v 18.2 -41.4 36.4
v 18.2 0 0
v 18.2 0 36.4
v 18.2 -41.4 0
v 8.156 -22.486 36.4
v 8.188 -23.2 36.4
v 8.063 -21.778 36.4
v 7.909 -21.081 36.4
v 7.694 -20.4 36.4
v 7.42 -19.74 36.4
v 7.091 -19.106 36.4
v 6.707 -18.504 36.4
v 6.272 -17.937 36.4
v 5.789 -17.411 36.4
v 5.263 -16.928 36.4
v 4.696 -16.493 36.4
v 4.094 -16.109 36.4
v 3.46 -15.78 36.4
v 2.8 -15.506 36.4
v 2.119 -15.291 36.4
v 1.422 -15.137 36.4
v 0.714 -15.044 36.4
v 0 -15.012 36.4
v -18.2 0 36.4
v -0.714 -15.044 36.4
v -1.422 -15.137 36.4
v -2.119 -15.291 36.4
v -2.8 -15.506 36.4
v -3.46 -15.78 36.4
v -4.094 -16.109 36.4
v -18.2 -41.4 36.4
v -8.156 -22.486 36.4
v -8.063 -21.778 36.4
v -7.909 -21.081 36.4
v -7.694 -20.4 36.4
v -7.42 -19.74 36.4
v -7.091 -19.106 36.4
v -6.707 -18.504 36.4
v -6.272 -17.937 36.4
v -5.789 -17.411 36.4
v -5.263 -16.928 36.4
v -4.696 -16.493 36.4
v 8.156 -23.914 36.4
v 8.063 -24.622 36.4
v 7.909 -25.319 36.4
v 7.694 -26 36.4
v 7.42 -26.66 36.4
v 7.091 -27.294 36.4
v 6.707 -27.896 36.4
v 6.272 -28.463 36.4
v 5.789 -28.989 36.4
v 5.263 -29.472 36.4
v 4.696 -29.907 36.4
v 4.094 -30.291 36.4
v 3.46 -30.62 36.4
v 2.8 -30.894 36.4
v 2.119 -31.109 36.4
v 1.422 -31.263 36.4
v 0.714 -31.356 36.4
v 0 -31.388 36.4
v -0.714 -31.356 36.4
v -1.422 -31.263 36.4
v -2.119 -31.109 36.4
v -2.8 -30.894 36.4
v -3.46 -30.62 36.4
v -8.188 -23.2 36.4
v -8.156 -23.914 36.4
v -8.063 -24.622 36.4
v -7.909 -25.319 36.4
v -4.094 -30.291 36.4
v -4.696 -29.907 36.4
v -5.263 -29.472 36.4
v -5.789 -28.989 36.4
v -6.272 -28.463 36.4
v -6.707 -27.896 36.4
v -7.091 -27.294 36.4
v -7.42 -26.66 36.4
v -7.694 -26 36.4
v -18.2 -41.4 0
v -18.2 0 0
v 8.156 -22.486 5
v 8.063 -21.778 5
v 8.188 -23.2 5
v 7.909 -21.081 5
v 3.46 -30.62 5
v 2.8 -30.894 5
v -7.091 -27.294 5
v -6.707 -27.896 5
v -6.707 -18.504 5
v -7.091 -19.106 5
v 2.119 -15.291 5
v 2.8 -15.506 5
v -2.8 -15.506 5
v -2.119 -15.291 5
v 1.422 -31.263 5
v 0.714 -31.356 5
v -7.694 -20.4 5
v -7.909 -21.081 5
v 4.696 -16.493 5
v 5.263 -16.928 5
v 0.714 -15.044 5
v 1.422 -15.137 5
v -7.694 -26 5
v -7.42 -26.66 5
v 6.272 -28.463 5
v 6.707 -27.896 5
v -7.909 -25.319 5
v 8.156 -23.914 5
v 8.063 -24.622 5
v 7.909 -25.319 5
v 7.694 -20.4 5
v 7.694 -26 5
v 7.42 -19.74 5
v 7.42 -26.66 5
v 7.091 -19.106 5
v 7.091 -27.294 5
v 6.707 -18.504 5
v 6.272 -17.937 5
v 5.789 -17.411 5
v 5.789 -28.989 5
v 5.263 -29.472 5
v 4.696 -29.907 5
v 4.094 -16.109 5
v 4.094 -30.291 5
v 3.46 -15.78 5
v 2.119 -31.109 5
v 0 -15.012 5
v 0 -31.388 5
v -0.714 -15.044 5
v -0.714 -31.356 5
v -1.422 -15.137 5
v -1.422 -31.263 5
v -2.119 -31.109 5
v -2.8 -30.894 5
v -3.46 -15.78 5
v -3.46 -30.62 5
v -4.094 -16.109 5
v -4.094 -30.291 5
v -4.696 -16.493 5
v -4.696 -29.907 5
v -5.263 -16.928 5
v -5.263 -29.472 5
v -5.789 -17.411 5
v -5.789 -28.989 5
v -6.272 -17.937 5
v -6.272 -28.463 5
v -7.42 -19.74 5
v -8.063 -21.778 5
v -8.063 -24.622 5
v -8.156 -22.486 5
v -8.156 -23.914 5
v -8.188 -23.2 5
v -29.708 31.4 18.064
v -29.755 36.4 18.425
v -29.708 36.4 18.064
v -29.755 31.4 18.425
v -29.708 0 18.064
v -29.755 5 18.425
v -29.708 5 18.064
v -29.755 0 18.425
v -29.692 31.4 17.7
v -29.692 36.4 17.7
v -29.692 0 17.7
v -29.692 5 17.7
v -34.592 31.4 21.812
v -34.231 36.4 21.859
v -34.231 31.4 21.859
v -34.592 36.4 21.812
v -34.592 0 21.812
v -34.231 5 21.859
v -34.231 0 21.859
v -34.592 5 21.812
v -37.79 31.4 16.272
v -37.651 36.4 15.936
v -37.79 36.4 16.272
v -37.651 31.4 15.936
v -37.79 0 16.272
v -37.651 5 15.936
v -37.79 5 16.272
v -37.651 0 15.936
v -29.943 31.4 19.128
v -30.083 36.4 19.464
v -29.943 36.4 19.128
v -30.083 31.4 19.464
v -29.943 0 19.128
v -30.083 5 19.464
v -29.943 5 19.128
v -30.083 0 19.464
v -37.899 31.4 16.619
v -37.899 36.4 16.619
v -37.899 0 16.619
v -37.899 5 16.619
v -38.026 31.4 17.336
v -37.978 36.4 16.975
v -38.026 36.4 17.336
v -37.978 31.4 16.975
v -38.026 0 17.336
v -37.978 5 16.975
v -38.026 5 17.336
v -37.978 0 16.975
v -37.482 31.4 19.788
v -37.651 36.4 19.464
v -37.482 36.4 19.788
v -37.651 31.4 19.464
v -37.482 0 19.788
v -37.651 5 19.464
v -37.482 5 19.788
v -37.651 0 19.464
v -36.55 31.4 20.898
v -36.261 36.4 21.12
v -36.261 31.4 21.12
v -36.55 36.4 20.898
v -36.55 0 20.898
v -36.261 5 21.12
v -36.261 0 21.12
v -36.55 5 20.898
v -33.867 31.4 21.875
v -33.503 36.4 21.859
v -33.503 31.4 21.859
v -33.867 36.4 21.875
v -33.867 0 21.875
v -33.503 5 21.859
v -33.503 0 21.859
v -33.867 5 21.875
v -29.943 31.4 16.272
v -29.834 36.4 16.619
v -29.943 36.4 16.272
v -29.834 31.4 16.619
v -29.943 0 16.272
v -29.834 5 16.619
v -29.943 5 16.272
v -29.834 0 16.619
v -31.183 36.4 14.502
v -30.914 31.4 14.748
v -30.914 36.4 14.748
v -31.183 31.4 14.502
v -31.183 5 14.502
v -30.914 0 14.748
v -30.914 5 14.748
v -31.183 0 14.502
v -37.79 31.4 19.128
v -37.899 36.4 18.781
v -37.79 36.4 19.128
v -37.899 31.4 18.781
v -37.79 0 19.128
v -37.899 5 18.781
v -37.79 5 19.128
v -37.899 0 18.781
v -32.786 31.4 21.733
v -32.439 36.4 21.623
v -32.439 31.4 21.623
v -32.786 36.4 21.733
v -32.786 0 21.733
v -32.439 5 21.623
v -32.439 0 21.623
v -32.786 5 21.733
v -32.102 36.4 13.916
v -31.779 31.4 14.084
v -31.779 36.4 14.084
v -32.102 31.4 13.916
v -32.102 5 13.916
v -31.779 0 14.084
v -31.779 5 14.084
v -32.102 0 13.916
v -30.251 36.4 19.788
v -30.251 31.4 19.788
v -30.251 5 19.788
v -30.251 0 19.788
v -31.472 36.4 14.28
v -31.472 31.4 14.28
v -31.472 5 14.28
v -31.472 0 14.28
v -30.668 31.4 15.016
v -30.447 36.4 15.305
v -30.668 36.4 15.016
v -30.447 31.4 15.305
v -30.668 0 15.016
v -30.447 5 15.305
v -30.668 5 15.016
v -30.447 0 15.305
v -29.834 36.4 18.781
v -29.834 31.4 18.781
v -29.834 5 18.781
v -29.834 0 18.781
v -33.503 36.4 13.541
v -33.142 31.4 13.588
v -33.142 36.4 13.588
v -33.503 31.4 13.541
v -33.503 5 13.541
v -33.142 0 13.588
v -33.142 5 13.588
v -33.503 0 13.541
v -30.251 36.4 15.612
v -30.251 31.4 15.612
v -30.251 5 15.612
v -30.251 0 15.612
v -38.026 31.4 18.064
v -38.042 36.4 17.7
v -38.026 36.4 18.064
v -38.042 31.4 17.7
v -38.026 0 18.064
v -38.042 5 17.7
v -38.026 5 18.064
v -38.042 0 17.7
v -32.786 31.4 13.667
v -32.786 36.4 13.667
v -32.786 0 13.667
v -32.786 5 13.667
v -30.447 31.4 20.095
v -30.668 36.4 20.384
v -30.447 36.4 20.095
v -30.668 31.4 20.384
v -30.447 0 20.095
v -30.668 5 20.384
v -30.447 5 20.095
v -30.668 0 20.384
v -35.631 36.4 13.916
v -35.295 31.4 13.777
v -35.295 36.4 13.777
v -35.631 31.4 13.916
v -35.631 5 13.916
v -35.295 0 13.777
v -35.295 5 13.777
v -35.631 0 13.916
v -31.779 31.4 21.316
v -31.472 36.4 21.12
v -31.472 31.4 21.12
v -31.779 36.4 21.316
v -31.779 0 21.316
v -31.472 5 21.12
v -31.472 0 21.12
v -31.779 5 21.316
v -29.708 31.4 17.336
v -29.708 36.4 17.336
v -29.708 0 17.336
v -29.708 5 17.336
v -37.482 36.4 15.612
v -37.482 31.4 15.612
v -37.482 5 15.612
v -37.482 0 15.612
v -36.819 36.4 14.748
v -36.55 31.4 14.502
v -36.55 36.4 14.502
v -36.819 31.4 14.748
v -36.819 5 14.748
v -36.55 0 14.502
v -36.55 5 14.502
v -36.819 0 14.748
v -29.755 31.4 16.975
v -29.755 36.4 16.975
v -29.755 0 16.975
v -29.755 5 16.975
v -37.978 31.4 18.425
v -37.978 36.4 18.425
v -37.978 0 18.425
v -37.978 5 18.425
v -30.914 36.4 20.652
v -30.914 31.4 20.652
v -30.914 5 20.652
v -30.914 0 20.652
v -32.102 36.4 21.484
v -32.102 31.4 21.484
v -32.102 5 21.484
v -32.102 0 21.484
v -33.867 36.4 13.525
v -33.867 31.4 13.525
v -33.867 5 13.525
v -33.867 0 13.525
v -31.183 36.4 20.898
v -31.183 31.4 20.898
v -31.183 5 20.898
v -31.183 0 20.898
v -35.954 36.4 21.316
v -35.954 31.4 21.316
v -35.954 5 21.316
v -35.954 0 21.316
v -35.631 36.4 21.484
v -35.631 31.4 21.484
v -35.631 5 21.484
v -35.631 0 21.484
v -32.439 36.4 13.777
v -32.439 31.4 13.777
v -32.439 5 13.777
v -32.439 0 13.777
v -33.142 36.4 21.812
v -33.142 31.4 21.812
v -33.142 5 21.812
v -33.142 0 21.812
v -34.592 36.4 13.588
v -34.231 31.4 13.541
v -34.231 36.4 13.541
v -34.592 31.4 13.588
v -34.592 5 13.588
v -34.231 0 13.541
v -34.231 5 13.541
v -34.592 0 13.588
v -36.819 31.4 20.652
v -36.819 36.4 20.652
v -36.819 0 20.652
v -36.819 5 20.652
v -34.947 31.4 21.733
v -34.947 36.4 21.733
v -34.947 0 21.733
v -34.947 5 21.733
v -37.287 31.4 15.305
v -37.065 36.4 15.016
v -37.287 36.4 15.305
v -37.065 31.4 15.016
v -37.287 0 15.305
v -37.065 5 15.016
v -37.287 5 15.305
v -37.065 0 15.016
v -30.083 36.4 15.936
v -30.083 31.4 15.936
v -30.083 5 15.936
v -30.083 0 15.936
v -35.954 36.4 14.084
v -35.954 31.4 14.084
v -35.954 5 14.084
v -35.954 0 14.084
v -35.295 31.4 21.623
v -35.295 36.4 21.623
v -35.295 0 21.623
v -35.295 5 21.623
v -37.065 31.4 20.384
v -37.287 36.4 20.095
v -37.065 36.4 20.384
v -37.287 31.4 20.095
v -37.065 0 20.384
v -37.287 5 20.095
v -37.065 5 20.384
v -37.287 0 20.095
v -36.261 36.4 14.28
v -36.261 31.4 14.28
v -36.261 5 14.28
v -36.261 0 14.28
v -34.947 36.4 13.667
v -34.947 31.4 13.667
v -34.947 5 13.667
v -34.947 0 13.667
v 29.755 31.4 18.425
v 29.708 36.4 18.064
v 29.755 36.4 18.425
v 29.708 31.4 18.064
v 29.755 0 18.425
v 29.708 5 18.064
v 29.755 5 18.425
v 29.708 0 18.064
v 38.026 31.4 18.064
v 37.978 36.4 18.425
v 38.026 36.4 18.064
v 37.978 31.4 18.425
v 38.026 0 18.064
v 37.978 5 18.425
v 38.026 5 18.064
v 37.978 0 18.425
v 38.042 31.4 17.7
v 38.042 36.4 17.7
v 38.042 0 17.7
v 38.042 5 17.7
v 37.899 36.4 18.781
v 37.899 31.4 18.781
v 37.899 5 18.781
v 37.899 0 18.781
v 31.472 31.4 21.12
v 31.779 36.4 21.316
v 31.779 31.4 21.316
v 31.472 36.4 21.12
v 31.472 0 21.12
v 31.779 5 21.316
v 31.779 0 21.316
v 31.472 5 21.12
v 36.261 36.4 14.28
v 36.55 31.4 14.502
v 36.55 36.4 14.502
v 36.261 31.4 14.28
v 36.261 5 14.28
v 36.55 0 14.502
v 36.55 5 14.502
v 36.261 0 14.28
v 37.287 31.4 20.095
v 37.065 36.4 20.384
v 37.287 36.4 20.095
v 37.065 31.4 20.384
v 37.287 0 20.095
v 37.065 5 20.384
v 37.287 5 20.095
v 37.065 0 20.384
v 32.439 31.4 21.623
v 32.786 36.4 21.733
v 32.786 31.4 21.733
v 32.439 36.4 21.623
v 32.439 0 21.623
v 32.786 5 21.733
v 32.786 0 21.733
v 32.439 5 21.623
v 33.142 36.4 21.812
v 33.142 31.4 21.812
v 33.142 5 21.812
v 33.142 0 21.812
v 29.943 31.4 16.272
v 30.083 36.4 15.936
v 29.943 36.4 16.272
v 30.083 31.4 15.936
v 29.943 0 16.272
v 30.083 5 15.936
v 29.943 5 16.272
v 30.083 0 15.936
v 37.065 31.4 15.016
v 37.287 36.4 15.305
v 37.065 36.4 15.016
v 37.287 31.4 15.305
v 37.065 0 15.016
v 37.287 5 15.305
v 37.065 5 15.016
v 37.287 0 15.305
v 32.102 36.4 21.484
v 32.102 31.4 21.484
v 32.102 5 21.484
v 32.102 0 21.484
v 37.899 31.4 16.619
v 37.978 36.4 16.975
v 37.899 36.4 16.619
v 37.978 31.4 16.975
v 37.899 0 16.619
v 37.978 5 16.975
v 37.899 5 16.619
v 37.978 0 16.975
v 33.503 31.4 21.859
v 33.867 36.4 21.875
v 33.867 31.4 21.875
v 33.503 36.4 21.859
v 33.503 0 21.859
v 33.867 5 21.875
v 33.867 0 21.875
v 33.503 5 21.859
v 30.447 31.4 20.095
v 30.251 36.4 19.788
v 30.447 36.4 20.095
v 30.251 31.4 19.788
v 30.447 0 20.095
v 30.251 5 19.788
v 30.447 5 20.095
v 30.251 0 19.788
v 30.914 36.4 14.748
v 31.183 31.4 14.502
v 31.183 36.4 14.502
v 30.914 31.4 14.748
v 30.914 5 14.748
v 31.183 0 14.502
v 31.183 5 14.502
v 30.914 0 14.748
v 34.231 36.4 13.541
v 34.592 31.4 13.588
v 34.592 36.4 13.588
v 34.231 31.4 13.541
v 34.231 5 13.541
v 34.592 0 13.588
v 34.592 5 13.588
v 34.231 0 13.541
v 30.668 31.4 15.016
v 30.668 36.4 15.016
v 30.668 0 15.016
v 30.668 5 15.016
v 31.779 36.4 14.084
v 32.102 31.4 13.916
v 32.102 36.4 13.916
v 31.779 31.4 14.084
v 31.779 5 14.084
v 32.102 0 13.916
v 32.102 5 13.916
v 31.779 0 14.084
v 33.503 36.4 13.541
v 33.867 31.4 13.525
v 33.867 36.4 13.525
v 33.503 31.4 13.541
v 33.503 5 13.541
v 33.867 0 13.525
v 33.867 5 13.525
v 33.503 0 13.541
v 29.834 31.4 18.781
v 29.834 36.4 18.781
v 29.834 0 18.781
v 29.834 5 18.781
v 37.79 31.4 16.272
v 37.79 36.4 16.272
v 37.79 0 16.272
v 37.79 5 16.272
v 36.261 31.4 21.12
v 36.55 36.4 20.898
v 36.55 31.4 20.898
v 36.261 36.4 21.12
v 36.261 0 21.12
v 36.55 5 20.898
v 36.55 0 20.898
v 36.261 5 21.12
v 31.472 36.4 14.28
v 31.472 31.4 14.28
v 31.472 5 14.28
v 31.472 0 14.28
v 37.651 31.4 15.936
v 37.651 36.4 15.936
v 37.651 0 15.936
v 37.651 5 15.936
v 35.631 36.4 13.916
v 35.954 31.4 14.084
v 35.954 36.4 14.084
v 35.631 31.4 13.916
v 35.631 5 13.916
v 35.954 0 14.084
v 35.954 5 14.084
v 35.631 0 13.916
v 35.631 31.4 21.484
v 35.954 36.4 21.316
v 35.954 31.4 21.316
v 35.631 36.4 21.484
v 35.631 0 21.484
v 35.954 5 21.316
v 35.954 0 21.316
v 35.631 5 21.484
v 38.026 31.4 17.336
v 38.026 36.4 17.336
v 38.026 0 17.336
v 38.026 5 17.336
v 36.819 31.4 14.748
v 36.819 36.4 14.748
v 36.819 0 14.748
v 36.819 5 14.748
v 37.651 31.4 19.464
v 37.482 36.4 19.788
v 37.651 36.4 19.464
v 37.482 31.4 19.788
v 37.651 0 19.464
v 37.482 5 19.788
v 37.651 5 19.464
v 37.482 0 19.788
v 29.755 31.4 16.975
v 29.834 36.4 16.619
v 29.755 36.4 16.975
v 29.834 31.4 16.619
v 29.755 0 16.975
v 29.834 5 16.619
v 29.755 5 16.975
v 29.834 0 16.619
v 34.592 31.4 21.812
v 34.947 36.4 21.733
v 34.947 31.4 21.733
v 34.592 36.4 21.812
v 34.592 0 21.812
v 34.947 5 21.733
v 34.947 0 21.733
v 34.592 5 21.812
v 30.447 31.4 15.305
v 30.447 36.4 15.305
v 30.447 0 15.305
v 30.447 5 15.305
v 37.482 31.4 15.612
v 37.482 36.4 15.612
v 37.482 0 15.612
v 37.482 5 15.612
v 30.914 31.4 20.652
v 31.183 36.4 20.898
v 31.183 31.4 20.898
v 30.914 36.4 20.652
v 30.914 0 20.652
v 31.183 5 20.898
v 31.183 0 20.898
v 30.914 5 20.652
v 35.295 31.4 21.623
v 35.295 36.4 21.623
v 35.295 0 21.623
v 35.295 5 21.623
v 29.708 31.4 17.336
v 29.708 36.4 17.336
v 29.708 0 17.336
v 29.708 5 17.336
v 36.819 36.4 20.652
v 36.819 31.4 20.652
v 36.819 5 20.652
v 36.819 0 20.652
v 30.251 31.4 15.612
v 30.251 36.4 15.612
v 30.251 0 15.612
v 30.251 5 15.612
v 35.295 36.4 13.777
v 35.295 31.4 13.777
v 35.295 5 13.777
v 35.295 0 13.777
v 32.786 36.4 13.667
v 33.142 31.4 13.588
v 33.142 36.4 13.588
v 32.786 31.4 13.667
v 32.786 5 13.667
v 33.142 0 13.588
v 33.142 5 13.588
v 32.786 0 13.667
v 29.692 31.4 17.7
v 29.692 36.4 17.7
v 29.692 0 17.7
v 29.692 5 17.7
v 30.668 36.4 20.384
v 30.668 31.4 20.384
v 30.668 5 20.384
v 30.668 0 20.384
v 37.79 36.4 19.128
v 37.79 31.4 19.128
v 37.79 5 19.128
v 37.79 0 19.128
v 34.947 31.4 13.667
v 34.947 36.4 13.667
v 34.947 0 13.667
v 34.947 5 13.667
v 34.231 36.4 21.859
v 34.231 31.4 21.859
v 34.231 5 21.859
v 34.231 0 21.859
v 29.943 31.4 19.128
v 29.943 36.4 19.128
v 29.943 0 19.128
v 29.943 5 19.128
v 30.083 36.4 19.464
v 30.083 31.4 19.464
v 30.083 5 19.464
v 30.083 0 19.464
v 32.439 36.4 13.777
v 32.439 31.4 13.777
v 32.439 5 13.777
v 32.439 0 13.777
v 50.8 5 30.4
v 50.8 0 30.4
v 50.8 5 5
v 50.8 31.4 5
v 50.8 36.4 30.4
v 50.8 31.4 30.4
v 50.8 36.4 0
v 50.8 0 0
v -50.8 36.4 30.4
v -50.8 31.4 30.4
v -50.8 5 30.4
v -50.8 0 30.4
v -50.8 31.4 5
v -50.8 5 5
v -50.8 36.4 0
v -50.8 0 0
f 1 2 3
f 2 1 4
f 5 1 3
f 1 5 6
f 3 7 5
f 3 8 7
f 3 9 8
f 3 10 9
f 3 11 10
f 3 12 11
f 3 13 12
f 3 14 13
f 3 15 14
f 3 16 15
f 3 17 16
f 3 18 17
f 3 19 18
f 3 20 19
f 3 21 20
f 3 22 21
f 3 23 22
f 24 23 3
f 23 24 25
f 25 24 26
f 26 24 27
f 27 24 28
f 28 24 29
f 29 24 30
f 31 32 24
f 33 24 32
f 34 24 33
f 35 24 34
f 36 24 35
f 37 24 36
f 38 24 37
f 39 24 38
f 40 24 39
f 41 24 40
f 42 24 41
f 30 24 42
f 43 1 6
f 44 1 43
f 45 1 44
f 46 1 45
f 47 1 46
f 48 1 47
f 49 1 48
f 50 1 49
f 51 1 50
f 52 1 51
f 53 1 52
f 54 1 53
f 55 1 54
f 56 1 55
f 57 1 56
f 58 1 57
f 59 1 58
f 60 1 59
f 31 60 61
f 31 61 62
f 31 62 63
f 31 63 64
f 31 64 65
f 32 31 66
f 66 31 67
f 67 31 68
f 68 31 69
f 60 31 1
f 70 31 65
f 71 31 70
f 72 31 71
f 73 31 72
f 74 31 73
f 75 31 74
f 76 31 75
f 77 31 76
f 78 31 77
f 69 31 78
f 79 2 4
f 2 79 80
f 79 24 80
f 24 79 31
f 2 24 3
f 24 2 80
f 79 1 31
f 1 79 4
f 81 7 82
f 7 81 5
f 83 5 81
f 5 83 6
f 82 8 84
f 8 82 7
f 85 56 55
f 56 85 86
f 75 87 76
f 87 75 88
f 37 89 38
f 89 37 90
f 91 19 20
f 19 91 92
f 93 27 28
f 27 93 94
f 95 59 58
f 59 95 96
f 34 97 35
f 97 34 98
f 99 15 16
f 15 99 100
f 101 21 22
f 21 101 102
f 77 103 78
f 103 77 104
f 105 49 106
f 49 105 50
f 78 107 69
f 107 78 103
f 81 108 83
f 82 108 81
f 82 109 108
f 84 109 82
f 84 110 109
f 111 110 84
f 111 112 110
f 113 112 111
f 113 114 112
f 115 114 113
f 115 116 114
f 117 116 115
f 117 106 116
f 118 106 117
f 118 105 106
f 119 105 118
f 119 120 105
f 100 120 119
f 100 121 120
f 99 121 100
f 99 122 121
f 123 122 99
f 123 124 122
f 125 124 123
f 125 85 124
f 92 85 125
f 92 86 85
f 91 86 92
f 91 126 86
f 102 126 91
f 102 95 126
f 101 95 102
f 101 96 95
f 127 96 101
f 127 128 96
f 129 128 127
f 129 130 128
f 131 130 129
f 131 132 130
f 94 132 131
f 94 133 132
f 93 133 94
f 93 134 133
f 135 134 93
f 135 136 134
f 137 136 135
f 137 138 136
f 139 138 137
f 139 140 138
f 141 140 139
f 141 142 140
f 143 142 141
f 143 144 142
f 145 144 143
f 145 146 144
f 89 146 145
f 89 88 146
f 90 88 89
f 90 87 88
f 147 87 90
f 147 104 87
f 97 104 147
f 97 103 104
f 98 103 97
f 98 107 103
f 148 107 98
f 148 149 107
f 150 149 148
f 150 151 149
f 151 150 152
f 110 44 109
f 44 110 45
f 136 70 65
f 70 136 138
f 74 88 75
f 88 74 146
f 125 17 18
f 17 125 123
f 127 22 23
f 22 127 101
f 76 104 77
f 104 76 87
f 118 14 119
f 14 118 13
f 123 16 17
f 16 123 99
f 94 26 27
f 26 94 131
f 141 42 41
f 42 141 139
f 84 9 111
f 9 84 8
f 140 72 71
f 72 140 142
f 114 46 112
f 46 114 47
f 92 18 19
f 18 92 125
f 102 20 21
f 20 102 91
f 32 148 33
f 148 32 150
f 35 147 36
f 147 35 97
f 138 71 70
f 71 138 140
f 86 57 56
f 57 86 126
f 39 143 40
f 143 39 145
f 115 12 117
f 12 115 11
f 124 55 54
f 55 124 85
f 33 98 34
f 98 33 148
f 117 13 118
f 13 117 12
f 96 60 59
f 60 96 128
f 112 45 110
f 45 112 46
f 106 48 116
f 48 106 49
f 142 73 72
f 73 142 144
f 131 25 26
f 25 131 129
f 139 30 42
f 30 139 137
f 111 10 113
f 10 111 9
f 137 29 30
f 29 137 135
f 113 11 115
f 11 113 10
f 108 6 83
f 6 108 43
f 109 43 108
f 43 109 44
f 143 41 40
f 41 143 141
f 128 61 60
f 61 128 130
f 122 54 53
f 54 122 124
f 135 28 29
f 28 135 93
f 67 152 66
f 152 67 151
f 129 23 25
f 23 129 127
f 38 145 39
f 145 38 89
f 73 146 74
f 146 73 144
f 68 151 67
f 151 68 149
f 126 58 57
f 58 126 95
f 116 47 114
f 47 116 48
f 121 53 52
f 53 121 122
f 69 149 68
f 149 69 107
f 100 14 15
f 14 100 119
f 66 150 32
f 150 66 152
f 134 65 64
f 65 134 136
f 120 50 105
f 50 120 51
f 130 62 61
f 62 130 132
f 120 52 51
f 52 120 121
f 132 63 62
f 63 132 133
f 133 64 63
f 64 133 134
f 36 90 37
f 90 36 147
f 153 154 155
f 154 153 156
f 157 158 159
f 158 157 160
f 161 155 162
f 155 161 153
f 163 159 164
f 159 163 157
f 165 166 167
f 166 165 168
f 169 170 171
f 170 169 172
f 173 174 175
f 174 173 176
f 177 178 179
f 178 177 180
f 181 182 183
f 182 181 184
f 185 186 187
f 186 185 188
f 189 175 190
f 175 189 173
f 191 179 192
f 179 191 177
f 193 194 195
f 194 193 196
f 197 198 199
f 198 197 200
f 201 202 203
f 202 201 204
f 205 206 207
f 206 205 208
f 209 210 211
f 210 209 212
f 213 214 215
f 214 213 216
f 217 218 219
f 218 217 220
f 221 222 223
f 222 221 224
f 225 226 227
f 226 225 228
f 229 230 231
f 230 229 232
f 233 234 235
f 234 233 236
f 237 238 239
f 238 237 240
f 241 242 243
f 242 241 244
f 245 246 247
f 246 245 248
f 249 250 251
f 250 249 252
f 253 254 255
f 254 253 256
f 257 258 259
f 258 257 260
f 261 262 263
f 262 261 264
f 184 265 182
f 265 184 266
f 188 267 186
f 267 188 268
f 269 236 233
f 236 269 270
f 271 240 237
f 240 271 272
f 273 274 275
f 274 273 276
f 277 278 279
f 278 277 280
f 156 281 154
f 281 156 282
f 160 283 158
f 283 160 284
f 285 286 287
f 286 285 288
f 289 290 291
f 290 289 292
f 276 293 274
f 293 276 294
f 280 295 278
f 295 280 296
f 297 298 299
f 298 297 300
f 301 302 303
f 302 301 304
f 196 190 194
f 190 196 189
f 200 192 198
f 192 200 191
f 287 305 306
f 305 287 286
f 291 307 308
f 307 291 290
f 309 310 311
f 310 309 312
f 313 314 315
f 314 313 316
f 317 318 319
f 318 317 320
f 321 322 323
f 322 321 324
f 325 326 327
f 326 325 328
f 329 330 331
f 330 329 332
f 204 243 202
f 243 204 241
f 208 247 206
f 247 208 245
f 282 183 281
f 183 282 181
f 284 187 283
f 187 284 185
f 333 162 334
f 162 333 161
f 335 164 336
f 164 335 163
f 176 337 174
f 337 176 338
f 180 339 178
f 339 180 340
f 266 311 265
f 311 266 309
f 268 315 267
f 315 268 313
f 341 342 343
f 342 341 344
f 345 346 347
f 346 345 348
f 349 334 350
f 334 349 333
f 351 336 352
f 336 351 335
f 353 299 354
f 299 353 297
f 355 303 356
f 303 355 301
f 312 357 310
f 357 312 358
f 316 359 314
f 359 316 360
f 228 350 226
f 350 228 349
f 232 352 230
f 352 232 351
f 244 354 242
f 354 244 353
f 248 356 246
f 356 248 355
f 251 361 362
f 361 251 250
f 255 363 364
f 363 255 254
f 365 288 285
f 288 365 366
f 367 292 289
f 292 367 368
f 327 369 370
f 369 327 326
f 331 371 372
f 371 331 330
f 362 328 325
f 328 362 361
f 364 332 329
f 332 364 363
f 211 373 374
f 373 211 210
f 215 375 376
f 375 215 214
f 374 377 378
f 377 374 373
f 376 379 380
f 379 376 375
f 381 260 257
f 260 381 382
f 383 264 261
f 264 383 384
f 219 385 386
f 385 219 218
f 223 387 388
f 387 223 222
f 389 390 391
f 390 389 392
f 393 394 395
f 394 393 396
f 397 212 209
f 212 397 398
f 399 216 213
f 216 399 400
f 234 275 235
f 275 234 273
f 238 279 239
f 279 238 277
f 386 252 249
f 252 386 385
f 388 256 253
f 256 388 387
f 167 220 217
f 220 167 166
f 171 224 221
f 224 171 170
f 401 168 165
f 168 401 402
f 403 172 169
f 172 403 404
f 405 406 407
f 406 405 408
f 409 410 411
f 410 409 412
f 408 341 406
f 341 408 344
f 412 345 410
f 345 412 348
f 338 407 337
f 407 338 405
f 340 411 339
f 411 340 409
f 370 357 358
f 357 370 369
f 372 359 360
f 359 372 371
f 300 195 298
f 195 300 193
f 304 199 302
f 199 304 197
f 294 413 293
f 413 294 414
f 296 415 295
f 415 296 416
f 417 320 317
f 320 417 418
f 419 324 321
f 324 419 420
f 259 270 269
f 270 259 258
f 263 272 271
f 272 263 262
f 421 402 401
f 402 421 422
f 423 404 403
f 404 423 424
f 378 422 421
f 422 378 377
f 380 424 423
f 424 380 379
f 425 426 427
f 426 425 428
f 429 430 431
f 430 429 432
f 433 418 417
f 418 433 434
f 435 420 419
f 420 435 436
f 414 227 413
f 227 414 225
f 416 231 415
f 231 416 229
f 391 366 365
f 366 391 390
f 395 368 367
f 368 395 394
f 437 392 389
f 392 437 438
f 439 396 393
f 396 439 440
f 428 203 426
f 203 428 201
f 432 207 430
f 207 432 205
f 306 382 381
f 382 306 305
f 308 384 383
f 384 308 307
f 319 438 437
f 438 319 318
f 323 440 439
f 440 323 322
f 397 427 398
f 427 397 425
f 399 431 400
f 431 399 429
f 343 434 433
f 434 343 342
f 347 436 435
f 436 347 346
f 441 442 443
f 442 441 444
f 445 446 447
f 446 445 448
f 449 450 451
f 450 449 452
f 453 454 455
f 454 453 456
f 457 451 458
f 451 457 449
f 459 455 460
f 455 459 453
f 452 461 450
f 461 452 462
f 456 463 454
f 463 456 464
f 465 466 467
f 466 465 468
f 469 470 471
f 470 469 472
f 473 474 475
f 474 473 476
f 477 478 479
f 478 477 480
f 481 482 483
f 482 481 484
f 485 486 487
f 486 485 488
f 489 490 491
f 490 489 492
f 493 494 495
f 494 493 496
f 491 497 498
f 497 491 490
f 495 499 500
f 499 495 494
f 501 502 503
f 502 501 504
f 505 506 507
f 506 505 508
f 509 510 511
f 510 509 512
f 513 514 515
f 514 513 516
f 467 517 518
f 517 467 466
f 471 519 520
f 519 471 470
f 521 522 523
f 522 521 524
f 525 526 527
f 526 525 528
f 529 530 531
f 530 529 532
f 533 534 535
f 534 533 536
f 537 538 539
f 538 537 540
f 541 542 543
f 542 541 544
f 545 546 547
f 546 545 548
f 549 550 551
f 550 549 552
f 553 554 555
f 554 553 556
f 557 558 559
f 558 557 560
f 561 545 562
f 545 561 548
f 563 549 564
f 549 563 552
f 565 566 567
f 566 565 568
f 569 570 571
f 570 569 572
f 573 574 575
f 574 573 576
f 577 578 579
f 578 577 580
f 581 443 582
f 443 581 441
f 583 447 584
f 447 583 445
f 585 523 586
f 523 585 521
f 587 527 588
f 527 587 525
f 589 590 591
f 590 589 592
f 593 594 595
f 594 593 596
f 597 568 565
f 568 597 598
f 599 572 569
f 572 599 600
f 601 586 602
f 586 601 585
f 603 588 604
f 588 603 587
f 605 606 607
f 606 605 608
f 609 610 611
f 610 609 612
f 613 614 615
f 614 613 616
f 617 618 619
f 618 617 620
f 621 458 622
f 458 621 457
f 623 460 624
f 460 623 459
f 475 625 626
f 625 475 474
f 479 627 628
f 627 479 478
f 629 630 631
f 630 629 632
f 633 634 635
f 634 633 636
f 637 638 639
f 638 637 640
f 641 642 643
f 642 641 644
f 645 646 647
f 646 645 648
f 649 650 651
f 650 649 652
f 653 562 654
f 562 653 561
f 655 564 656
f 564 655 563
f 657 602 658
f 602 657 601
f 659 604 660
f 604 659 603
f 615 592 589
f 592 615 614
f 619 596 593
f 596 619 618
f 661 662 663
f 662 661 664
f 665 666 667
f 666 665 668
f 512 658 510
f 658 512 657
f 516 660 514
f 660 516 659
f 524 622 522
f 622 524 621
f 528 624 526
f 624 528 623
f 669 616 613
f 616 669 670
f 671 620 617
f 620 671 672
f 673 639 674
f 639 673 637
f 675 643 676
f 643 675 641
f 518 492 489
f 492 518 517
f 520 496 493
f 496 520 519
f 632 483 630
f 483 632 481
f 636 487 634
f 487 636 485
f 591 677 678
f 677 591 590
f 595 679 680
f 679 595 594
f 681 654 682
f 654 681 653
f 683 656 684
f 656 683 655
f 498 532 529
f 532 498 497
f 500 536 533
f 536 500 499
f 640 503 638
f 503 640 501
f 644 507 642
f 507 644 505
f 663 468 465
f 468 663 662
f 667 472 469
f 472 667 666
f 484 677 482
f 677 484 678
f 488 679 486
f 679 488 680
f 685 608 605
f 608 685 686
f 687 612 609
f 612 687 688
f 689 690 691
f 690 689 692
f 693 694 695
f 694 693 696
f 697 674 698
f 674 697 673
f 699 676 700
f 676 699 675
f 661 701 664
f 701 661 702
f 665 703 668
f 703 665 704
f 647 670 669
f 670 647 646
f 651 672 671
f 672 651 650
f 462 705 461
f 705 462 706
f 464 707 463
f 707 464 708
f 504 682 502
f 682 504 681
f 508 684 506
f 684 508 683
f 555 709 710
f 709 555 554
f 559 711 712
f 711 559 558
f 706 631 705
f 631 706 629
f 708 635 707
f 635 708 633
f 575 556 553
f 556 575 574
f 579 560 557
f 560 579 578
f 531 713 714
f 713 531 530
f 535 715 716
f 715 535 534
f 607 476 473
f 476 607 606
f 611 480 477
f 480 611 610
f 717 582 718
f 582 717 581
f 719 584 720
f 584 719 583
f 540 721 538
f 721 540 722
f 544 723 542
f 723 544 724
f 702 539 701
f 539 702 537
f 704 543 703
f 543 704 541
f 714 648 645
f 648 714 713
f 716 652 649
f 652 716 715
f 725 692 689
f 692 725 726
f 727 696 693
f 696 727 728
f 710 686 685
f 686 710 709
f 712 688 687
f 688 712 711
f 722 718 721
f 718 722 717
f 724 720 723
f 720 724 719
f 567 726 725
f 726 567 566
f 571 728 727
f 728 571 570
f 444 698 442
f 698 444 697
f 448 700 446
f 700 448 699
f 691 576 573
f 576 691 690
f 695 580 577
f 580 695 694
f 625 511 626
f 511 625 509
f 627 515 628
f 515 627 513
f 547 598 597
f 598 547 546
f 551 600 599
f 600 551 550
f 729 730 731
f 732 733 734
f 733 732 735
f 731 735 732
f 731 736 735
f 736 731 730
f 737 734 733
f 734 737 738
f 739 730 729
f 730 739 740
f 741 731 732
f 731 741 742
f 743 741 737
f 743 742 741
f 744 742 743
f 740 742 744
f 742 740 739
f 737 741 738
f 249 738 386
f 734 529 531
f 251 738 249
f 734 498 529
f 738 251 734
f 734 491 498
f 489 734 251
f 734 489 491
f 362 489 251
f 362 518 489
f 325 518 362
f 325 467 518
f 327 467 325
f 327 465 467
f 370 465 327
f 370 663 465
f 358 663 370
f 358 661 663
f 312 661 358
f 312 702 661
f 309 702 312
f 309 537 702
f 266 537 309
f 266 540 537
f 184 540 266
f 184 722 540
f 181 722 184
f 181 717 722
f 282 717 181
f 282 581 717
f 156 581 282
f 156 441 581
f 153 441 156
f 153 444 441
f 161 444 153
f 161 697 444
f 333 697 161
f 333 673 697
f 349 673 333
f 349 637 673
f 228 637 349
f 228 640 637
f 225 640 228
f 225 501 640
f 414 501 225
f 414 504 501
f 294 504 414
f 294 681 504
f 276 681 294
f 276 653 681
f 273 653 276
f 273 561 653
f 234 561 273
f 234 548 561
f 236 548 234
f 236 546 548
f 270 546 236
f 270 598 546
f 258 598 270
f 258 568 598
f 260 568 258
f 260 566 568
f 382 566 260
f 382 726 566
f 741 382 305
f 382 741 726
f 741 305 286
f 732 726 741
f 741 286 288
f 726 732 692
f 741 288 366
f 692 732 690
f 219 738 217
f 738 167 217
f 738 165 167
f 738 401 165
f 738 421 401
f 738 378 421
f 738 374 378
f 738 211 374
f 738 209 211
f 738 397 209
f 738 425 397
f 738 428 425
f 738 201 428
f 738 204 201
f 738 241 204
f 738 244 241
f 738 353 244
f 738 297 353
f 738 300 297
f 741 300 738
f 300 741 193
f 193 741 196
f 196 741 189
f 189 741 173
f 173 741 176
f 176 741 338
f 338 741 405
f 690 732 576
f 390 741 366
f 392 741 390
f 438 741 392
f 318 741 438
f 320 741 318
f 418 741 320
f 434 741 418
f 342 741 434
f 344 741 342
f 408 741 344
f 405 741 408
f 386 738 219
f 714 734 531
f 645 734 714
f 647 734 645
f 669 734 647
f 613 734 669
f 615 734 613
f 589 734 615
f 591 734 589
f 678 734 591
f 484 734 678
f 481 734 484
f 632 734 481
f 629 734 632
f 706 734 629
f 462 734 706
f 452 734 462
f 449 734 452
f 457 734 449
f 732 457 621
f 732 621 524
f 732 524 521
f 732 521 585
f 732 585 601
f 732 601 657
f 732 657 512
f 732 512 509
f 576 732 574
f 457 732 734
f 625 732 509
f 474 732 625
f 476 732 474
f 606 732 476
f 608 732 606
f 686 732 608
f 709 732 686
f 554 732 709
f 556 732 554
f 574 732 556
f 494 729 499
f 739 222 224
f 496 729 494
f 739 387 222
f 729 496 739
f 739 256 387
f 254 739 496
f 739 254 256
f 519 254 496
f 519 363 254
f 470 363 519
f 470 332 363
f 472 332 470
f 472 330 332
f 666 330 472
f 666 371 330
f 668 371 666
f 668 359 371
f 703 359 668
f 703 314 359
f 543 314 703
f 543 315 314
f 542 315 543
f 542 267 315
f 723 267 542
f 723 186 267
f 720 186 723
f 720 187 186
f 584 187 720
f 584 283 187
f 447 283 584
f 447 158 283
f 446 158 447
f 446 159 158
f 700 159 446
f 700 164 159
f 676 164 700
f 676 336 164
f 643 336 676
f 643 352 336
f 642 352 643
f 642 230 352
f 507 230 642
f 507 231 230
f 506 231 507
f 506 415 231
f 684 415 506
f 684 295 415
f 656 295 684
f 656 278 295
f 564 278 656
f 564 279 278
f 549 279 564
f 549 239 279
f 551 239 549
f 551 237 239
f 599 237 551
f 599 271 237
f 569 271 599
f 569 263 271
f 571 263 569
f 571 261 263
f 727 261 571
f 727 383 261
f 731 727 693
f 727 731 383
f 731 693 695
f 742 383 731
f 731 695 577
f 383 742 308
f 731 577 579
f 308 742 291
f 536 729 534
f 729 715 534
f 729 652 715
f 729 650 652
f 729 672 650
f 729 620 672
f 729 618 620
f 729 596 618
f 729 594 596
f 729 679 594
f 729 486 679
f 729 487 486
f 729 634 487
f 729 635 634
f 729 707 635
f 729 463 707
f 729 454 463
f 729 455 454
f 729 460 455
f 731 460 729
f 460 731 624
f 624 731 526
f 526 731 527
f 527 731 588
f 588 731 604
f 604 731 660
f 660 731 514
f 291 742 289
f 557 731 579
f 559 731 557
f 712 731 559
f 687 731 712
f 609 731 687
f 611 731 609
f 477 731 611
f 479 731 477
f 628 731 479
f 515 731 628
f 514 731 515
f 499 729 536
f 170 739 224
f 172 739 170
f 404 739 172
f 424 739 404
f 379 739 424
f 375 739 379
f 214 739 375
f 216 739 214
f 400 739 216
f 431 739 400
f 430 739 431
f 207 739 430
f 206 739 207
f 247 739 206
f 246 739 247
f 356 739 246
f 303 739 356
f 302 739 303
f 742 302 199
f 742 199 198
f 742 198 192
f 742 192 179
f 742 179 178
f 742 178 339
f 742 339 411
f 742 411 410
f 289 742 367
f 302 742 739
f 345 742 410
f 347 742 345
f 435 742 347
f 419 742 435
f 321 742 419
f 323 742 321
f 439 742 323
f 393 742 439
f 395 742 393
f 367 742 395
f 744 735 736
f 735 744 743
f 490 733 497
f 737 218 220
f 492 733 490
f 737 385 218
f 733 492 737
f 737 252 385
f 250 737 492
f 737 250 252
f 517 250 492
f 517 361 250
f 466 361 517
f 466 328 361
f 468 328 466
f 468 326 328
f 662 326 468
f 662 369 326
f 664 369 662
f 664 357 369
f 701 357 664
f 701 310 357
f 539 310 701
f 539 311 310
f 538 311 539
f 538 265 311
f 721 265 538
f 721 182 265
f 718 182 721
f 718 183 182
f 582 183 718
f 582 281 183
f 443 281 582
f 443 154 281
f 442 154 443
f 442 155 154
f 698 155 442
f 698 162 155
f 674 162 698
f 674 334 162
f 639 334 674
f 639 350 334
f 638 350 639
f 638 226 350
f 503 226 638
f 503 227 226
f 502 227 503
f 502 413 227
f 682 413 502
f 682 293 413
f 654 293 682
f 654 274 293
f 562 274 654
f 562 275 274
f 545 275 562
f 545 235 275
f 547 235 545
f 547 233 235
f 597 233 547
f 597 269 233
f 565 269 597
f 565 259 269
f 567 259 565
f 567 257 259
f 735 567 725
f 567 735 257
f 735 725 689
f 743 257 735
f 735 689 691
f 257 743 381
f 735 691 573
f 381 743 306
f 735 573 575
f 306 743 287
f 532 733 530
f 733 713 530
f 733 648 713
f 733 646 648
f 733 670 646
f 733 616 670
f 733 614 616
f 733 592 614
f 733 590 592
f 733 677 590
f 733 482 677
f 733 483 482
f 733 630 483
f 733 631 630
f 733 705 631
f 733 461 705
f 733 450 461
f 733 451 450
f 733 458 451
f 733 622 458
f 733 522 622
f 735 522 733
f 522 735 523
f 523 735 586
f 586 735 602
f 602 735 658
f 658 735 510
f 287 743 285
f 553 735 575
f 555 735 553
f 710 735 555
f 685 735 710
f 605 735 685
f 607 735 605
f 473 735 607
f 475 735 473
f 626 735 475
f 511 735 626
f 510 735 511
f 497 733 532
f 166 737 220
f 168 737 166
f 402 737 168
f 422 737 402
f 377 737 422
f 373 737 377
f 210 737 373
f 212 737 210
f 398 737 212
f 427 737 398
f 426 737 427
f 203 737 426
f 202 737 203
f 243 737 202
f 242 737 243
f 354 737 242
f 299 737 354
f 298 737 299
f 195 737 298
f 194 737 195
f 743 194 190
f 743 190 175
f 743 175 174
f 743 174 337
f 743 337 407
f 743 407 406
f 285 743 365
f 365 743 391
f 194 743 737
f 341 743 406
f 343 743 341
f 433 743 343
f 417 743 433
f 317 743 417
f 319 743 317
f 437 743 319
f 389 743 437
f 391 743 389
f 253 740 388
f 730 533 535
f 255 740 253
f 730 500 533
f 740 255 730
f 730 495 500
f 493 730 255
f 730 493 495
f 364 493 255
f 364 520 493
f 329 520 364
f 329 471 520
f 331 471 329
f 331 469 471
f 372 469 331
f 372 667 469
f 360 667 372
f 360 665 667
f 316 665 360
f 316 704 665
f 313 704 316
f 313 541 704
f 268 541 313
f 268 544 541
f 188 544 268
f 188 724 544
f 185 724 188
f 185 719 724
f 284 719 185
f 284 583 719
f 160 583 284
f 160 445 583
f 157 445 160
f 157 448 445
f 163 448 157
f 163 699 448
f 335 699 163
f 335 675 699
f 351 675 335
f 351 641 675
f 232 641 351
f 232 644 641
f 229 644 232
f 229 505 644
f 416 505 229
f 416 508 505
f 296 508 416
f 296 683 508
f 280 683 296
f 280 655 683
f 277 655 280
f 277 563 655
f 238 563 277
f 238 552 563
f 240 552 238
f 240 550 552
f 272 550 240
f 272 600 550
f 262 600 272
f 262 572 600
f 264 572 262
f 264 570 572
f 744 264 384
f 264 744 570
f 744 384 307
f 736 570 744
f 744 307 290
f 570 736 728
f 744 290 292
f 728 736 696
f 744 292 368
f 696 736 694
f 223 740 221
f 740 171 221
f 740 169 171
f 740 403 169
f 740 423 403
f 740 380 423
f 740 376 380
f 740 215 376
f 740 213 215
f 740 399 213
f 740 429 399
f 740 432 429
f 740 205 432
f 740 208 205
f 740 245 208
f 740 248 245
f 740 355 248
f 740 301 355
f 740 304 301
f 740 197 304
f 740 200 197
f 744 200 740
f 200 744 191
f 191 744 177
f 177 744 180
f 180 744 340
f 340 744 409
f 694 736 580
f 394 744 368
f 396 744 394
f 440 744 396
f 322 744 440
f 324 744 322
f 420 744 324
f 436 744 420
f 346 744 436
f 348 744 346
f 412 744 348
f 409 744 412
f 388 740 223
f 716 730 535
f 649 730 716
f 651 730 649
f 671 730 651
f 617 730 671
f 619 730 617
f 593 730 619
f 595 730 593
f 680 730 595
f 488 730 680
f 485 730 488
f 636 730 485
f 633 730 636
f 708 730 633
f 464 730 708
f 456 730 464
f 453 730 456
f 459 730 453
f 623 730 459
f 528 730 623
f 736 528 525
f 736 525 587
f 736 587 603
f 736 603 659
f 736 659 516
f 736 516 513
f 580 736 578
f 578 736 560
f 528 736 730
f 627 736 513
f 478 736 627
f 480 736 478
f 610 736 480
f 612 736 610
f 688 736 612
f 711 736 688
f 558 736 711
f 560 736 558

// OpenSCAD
$fn = 72;

axleBracket4();

module axleBracket(axleDiam=(5/8)*25.4+1.5, cubeWidth=22.225, thickness=5, screwDiam=6)
{
    difference()
    {
        union()
        {
            translate([0, cubeWidth*.25, 0])
            cube([cubeWidth*1.5, cubeWidth*1.5, cubeWidth], center=true);
            translate([0, -(-thickness/2 + cubeWidth/2), 0])
            cube([cubeWidth*5, thickness, cubeWidth], center=true);
            translate([0, 0, -(-thickness/2 + cubeWidth/2)])
            cube([cubeWidth*5, cubeWidth, thickness], center=true);
        }
        union()
        {
            translate([0, cubeWidth*.25, 0])
            cylinder(d=axleDiam, h=cubeWidth+1, center=true);
            
            for(xOffset = [-cubeWidth*1.25, cubeWidth*1.25])
            {
                translate([xOffset, 0, 0])
                rotate([90, 0, 0])
                cylinder(d=screwDiam, h=thickness*5, center=true);
            }
            
            for(xOffset = [-cubeWidth*2, cubeWidth*2])
            {
                translate([xOffset, 0, 0])
                cylinder(d=screwDiam, h=thickness*5, center=true);
            }
        }
    }
}

module axleBracket2(axleDiam=(5/8)*25.4+1.5, length=25.4*4, thickness=5, screwDiam=(1/4*25.4))
{
    tubeWidth = 25.4;
    bracketWidth = tubeWidth + thickness*2;
    
    difference()
    {
        cube([length, bracketWidth, bracketWidth], center=true);
        
        union()
        {
            cube([length+1, tubeWidth, tubeWidth], center=true);
            
            for (xOffset = [-1*length/3, 1*length/3])
            {
                translate([xOffset, 0, 0])
                rotate([90, 0, 0])
                cylinder(d=screwDiam+2, h=bracketWidth*2, center=true);
            }
        }
    }
    
    translate([0, bracketWidth/2 + thickness*2, 0])
    difference()
    {
        cube([bracketWidth, thickness*4, bracketWidth], center=true);
        rotate([90, 0, 0])
        cylinder(d=axleDiam, h=thickness*5, center=true);
    }
}

module axleBracket3(axleDiam=(5/8)*25.4+.5, length=25.4*4, thickness=5, screwDiam=(1/4*25.4))
{
    tubeWidth = 25.4;
    bracketWidth = tubeWidth + thickness*2;
    
    difference()
    {
        translate([0, 0, thickness/2 + 1])
        cube([length, bracketWidth, thickness+2], center=true);
        
        union()
        {
            translate([0, 0, 1])
            cube([length+1, tubeWidth+1, 2], center=true);
            
            for (xOffset = [-1*length/3, 1*length/3])
            {
                translate([xOffset, 0, 0])
                cylinder(d=screwDiam+2, h=bracketWidth*2, center=true);
            }
        }
    }
    
    translate([0, 0, thickness*2 + thickness+2])
    difference()
    {
        cube([bracketWidth, bracketWidth, thickness*4], center=true);
        cylinder(d=axleDiam, h=thickness*5, center=true);
    }
}

module axleBracket4(axleDiam=(5/8)*25.4+.5, length=25.4*4, thickness=5, screwDiam=(1/4*25.4), axleOffset=5)
{
    tubeWidth = 25.4;
    bracketWidth = tubeWidth + 1 + thickness*2;
    
    // Axle Holder
    translate([0, -bracketWidth/2 - axleOffset/2, bracketWidth/2])
    difference()
    {
        cube([bracketWidth, bracketWidth + axleOffset, bracketWidth], center=true);
        
        translate([0, -axleOffset/2, thickness/2])
        cylinder(d=axleDiam, h=bracketWidth-thickness, center=true);
    }
    
    translate([0, bracketWidth/2, (tubeWidth+thickness)/2])
    difference()
    {
        cube([length, bracketWidth, tubeWidth+thickness], center=true);
        
        union()
        {
            translate([0, 0, thickness/2])
            cube([length, tubeWidth+1, tubeWidth], center=true);
            
            for (xOffset = [-1*length/3, 1*length/3])
            {
                translate([xOffset, 0, thickness/2])
                rotate([90, 0, 0])
                cylinder(d=screwDiam+2, h=bracketWidth*2, center=true);
            }
        }
    }
}
